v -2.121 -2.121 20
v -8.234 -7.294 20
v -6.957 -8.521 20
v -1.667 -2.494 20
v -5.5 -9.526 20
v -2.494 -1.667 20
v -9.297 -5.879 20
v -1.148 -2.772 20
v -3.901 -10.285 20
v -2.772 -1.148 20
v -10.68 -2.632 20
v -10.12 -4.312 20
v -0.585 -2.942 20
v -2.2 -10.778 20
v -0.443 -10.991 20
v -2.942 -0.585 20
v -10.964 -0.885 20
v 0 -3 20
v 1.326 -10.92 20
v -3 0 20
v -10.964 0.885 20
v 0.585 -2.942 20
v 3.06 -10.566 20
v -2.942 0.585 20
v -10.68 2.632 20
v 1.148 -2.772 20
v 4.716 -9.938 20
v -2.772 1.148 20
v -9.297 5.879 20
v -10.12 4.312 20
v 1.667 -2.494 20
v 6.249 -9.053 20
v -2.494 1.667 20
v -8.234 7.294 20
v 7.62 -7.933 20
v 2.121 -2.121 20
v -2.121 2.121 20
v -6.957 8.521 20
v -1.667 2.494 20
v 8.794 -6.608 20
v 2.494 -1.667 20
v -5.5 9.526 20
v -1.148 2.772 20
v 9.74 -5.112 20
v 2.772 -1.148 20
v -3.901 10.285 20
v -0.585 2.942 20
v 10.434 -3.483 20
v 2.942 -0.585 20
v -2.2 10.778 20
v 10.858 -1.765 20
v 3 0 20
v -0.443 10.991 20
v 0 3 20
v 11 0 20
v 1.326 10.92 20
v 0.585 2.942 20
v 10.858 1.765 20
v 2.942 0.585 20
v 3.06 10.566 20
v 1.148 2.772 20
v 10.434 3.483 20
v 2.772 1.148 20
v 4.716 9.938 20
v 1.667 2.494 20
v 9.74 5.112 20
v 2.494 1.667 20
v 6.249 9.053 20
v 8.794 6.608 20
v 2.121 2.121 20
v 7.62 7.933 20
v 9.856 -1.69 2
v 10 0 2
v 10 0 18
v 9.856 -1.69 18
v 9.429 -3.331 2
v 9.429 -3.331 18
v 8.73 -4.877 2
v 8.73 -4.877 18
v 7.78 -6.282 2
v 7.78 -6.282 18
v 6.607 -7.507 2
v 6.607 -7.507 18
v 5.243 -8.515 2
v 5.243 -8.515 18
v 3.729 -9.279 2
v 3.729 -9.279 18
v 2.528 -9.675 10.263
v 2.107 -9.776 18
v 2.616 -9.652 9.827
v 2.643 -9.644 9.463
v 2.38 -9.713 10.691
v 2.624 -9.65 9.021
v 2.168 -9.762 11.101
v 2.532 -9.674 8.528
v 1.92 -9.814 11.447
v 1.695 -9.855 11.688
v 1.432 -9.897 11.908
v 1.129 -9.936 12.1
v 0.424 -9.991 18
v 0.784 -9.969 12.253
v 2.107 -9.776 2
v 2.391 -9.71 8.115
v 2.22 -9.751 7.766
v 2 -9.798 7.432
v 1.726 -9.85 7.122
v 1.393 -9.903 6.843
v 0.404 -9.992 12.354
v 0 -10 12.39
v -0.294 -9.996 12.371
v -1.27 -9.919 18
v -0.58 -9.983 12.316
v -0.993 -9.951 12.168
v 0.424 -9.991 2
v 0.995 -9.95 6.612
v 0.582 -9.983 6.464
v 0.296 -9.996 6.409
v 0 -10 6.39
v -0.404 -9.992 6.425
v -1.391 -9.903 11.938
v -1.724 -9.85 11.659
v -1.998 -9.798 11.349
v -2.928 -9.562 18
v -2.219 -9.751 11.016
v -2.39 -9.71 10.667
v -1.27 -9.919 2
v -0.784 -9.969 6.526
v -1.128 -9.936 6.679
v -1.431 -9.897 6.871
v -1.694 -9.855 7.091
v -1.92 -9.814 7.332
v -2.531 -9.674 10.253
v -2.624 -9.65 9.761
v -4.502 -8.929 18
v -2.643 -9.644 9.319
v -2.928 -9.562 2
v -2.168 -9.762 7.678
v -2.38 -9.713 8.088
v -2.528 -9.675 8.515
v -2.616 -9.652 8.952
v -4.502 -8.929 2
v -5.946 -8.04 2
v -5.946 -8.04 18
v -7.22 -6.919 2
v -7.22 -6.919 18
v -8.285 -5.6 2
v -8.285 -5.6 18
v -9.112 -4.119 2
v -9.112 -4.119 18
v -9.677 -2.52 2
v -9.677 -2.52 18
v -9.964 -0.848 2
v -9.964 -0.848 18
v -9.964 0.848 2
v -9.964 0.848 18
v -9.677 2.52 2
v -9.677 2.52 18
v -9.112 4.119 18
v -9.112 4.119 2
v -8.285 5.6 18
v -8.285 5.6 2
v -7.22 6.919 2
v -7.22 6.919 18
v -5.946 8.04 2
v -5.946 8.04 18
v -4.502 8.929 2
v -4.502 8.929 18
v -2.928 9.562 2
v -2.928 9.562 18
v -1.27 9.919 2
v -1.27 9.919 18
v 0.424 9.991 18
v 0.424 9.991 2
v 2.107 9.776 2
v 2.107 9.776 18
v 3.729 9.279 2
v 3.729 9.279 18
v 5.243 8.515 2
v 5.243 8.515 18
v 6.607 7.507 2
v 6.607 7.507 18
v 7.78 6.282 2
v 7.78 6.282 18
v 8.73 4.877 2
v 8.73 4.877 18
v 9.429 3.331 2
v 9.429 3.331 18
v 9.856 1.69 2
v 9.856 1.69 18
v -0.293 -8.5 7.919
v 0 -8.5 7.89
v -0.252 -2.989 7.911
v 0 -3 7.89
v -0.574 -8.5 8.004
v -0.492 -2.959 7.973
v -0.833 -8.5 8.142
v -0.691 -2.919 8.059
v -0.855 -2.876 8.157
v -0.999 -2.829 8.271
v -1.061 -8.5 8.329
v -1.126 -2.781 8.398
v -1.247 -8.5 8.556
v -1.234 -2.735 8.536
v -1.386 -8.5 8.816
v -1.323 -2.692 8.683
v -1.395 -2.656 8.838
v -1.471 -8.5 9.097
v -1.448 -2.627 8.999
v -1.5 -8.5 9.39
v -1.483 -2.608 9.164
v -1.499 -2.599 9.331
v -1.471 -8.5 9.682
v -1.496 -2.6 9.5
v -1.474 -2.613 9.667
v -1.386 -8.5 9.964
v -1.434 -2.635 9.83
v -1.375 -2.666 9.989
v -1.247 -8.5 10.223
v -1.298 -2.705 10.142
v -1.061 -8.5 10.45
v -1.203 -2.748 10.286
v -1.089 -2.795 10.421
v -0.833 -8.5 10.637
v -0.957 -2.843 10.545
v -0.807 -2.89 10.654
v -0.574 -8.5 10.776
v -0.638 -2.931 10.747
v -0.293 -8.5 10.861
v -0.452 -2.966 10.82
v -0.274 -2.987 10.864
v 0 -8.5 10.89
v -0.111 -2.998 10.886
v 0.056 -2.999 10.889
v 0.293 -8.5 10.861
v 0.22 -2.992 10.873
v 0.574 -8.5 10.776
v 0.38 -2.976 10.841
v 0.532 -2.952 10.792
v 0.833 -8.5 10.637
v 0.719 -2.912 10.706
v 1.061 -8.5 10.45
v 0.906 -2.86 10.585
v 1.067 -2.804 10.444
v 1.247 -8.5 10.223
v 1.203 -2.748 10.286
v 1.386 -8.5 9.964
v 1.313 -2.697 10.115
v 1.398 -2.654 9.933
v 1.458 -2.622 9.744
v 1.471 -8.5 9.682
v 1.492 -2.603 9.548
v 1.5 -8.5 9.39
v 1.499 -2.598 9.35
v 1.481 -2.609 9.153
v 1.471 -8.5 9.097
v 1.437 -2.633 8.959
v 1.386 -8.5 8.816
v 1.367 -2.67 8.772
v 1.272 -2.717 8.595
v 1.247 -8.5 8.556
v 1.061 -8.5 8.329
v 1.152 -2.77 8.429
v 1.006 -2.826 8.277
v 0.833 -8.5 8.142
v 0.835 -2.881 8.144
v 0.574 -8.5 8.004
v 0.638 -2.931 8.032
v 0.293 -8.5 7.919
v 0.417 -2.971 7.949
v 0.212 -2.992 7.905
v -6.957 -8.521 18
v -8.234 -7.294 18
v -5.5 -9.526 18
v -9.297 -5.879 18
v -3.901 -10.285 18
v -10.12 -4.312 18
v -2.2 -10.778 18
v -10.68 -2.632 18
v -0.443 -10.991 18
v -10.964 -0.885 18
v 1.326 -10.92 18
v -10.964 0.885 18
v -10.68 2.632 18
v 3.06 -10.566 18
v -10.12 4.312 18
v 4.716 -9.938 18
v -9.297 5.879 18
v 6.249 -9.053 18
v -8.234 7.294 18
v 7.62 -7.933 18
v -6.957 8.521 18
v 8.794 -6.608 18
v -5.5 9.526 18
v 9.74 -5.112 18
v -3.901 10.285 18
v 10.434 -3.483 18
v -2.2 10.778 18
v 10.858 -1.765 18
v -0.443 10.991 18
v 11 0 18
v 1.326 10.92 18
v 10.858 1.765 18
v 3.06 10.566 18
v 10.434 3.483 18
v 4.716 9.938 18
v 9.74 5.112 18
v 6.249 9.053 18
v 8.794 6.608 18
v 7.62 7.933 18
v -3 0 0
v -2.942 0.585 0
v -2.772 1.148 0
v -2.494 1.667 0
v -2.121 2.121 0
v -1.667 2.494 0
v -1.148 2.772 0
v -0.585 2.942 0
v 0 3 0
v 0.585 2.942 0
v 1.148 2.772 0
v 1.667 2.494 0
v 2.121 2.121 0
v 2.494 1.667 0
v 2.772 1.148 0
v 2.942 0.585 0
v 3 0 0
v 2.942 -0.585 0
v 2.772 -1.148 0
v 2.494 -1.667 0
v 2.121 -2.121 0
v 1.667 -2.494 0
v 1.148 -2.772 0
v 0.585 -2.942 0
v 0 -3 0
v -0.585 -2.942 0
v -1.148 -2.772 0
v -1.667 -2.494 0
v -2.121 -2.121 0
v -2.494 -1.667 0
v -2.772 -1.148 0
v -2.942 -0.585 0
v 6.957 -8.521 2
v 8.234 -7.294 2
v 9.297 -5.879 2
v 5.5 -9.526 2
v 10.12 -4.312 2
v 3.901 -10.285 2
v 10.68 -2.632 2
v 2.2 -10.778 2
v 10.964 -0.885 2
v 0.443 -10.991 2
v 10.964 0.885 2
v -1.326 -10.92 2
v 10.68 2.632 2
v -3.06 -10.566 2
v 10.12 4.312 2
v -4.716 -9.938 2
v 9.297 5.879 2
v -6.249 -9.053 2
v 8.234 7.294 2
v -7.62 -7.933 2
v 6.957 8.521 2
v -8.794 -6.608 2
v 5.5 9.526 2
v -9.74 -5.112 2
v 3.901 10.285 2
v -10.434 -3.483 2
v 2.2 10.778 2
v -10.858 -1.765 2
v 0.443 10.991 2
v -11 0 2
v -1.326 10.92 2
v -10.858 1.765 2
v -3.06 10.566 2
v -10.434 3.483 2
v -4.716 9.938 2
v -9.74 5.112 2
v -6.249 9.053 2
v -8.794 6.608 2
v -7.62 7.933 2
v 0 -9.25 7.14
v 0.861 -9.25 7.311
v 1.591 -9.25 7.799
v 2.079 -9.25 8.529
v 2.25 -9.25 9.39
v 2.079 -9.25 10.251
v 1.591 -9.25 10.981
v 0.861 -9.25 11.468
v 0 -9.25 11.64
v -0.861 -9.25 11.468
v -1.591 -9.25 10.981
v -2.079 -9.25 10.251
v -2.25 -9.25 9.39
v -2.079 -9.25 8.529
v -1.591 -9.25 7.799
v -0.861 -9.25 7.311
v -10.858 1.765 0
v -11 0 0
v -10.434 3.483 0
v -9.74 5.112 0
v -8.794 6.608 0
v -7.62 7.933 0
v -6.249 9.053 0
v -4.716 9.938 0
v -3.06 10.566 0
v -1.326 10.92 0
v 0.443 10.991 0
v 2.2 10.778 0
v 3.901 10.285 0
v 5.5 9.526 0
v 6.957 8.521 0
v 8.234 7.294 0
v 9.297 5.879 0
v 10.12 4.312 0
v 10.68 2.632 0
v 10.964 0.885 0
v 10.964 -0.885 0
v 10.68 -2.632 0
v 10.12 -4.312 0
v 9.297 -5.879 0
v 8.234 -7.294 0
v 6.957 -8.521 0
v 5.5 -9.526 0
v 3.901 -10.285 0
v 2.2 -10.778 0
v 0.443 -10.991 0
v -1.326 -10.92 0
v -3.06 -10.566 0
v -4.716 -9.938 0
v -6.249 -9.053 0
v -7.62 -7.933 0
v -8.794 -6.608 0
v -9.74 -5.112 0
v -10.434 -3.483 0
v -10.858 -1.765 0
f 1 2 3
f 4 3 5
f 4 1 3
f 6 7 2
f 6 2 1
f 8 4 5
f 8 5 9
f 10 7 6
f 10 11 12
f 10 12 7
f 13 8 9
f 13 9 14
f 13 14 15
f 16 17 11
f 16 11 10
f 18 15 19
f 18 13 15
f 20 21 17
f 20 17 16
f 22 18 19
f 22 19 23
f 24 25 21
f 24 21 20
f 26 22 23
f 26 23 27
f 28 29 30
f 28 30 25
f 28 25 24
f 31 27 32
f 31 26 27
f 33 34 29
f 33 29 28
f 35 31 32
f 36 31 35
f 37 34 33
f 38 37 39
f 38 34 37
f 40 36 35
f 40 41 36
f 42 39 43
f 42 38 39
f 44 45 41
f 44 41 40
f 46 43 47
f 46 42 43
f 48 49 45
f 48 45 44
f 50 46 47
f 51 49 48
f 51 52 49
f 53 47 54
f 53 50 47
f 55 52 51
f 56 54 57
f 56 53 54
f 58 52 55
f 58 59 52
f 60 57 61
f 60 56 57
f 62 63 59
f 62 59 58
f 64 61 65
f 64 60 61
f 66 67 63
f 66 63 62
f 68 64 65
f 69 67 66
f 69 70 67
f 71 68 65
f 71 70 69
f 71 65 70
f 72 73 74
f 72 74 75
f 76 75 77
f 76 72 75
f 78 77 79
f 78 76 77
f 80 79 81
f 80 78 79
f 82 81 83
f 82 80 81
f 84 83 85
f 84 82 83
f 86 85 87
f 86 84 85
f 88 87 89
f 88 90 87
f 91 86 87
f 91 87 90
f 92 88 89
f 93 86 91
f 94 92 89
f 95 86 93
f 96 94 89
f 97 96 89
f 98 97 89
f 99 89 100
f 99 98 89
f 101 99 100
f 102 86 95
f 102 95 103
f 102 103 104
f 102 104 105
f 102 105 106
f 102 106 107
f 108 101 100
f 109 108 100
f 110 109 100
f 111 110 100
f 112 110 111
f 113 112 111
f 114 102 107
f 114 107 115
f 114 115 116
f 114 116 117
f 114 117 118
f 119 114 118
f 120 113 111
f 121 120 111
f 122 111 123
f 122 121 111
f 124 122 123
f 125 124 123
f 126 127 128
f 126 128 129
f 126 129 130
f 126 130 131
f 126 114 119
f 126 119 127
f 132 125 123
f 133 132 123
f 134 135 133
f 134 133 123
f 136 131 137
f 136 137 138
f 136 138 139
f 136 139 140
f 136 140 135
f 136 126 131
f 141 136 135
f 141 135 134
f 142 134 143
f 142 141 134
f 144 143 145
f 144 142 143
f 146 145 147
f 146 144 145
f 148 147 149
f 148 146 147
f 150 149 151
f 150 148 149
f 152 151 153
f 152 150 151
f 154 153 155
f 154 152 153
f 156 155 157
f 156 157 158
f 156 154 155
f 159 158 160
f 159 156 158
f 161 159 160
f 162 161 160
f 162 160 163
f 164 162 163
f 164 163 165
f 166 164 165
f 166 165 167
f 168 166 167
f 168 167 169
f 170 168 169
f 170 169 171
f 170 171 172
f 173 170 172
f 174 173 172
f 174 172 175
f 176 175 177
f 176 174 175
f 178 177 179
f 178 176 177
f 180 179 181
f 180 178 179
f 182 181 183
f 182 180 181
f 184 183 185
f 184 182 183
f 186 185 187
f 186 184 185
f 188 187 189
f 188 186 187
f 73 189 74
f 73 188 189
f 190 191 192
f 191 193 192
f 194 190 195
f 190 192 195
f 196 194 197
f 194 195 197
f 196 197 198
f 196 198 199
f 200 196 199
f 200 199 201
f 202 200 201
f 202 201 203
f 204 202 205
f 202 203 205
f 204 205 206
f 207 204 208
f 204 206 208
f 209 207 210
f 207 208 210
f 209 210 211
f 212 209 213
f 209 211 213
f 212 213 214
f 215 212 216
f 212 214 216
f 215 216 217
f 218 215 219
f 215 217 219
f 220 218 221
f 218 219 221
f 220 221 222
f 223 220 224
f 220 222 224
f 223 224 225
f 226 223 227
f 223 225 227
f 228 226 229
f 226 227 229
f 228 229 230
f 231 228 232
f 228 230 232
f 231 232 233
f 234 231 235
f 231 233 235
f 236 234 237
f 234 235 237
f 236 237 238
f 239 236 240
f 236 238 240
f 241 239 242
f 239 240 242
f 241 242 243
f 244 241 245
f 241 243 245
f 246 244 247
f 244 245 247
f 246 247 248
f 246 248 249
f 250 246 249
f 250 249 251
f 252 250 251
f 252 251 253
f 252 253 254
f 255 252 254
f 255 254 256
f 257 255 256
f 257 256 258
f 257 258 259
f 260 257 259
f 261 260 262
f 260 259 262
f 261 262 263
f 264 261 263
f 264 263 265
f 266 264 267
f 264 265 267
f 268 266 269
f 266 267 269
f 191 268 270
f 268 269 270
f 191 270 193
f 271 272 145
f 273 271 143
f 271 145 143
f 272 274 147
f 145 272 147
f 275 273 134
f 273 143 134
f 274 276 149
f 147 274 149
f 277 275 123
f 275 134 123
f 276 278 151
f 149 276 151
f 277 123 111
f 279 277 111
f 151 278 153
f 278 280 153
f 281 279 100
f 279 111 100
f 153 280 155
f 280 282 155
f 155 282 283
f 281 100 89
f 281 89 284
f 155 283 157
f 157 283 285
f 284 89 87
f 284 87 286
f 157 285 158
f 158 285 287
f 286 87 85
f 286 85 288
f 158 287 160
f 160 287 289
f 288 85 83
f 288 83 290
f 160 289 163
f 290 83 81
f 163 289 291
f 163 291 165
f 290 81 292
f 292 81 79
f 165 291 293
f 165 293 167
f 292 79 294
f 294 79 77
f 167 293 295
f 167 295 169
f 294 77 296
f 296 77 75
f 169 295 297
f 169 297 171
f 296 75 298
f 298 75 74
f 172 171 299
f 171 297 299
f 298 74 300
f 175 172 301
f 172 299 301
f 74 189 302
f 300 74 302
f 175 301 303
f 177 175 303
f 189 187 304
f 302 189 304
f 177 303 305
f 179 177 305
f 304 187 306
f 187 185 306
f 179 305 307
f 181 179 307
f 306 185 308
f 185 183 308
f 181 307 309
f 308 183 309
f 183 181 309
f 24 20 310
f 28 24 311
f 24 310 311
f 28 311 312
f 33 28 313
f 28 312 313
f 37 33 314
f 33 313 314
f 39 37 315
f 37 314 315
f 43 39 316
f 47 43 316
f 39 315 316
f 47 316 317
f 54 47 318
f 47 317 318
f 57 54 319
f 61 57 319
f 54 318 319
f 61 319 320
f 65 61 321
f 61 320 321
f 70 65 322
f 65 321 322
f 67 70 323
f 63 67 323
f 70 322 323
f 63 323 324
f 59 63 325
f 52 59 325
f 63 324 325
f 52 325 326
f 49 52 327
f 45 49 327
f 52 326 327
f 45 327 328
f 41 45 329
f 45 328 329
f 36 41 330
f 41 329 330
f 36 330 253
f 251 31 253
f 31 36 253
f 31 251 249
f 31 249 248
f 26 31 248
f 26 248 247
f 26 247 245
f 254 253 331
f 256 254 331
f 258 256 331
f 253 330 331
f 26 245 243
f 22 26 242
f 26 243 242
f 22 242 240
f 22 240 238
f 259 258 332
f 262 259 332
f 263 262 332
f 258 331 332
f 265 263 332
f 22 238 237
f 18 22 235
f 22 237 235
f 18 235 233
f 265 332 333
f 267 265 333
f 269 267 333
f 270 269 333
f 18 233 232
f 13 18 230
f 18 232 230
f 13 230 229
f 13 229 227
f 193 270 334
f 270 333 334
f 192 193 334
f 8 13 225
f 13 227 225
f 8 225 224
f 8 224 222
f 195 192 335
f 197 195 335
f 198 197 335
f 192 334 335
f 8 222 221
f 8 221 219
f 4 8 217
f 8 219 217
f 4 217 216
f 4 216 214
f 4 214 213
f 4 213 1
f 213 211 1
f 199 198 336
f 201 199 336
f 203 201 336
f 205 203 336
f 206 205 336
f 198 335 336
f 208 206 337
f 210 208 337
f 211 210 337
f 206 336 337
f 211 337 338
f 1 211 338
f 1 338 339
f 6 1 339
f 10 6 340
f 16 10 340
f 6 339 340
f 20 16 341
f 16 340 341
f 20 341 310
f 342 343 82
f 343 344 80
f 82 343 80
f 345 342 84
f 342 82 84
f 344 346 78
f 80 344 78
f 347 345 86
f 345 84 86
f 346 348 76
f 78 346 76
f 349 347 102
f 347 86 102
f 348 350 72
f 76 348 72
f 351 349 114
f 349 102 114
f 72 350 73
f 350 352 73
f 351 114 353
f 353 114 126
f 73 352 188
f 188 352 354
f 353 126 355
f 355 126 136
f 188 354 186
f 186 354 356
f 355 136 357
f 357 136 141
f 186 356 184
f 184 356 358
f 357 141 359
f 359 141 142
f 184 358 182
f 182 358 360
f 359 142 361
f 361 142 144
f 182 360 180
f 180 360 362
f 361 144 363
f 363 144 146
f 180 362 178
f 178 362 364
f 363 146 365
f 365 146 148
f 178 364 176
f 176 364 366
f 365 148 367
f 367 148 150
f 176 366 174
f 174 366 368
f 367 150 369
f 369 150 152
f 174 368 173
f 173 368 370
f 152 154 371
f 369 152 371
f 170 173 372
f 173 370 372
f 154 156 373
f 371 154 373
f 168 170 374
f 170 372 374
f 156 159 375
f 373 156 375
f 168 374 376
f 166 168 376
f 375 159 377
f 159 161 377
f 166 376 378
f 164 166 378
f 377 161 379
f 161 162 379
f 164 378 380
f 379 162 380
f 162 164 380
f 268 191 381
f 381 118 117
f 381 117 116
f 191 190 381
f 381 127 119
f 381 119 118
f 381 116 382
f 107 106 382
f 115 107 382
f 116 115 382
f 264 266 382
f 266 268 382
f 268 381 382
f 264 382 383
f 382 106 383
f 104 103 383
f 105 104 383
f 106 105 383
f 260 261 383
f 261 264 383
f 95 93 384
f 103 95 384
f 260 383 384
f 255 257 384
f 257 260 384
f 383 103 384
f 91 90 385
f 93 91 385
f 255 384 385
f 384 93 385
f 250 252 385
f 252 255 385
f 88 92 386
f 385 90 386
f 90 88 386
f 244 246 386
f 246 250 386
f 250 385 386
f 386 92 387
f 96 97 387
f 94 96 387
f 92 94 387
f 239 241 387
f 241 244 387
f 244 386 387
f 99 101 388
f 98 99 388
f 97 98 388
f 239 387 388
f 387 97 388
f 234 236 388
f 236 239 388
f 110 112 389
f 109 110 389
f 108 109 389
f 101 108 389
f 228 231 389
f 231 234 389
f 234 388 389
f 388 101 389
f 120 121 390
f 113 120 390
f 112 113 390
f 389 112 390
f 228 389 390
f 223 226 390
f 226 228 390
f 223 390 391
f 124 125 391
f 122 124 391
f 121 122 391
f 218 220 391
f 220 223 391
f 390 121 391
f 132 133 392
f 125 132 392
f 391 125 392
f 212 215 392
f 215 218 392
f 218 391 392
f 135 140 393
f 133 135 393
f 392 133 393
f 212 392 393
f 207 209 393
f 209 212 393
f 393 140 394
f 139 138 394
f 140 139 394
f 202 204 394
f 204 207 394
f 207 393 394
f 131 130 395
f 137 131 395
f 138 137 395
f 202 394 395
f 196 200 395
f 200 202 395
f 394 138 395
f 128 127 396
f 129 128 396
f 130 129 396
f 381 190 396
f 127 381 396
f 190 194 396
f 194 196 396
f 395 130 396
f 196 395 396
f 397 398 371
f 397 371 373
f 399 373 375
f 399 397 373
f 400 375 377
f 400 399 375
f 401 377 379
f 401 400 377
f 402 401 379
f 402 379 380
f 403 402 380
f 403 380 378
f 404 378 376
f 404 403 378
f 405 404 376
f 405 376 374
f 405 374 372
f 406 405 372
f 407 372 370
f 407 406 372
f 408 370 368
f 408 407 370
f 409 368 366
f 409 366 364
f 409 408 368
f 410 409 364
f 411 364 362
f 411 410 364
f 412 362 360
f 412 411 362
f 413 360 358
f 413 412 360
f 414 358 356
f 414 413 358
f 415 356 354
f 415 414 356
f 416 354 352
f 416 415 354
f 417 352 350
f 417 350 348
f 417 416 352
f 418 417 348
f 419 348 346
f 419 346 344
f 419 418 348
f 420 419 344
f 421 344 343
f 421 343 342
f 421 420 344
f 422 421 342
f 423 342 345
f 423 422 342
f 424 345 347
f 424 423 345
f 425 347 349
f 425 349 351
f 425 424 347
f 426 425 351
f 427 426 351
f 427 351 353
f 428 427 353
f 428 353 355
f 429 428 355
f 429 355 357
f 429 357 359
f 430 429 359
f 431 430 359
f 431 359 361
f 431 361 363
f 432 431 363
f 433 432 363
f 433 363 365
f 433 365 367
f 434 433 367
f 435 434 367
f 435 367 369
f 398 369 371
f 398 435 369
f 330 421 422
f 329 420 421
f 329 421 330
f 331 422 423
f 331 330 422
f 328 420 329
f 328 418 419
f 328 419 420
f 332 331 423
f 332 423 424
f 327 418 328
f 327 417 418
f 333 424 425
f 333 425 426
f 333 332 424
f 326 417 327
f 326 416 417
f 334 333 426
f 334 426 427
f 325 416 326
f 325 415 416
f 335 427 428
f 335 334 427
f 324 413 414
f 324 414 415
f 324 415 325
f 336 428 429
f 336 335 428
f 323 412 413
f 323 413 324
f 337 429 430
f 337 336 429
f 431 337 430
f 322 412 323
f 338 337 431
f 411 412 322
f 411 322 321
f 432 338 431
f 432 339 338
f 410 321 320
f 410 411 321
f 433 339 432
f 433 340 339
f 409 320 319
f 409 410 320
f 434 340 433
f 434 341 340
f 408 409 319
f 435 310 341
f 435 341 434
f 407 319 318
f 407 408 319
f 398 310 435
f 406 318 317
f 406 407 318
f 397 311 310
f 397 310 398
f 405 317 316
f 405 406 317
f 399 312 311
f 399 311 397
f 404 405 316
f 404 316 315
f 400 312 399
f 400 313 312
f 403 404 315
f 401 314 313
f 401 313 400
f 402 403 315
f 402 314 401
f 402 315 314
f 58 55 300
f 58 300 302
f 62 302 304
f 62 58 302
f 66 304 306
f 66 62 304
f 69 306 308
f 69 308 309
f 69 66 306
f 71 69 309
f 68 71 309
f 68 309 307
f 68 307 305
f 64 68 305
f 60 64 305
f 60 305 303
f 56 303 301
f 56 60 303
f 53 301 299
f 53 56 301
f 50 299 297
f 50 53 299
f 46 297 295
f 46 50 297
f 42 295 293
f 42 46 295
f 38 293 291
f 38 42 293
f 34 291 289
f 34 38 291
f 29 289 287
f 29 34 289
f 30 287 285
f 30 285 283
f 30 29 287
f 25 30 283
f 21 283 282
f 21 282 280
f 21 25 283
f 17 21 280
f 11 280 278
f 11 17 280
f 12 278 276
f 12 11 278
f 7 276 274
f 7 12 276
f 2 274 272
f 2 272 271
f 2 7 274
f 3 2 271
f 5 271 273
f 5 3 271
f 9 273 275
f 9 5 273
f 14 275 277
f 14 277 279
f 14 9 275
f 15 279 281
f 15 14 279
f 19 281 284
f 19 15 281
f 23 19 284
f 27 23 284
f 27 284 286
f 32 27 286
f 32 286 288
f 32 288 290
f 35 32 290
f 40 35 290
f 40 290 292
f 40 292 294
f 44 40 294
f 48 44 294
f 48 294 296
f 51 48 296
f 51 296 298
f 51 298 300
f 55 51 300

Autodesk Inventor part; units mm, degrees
ref_plane "YZ Plane" through (0, 0, 0) normal (1, 0, 0) x (0, 1, 0)
ref_plane "XZ Plane" through (0, 0, 0) normal (0, 1, 0) x (-1, 0, 0)
ref_plane "XY Plane" through (0, 0, 0) normal (0, 0, 1) x (1, 0, 0)
sketch "Sketch1" plane through (0, 0, 0) normal (0, 0, 1) x (1, 0, 0)
  circle A0 centre (0, 0) radius 10
  dimension "d0" = 20
extrude "Extrusion1" add sketch "Sketch1" along normal blind 20
sketch "Sketch2" plane through (0, 0, 20) normal (0, 0, 1) x (1, 0, 0)
  circle A0 centre (0, 0) radius 11
  dimension "d3" = 22
extrude "Extrusion2" add sketch "Sketch2" against normal blind 2
sketch "Sketch3" plane through (0, 0, 0) normal (0, 0, -1) x (-1, 0, 0)
  circle A0 centre (0, 0) radius 11
extrude "Extrusion3" add sketch "Sketch3" against normal blind 2
sketch "Sketch4" plane through (0, 0, 0) normal (0, 1, 0) x (-1, 0, 0)
  circle A0 centre (0, 9.3897) radius 1.5
  point P0 (0, 0)
  dimension "d8" = 3
extrude "Extrusion4" add sketch "Sketch4" against normal blind 10
sketch "Sketch5" plane through (0, -10, 0) normal (0, -1, 0) x (1, 0, 0)
  arc A0 (0, 7.8897) -> (0, 10.8897) centre (0, 9.3897) ccw projected
  point P0 (0, 0)
hole "Hole1" at (0, -10, 9.3897) direction (0, 1, 0) diameter 3 depth 10 tip angle 118 countersink diameter 6 countersink angle 90
sketch "Sketch6" plane through (0, 0, 0) normal (0, 0, -1) x (-1, 0, 0)
  circle A0 centre (0, 0) radius 3
  dimension "d18" = 6
extrude "Extrusion5" cut sketch "Sketch6" against normal blind 20
properties part number "bearing v3"
